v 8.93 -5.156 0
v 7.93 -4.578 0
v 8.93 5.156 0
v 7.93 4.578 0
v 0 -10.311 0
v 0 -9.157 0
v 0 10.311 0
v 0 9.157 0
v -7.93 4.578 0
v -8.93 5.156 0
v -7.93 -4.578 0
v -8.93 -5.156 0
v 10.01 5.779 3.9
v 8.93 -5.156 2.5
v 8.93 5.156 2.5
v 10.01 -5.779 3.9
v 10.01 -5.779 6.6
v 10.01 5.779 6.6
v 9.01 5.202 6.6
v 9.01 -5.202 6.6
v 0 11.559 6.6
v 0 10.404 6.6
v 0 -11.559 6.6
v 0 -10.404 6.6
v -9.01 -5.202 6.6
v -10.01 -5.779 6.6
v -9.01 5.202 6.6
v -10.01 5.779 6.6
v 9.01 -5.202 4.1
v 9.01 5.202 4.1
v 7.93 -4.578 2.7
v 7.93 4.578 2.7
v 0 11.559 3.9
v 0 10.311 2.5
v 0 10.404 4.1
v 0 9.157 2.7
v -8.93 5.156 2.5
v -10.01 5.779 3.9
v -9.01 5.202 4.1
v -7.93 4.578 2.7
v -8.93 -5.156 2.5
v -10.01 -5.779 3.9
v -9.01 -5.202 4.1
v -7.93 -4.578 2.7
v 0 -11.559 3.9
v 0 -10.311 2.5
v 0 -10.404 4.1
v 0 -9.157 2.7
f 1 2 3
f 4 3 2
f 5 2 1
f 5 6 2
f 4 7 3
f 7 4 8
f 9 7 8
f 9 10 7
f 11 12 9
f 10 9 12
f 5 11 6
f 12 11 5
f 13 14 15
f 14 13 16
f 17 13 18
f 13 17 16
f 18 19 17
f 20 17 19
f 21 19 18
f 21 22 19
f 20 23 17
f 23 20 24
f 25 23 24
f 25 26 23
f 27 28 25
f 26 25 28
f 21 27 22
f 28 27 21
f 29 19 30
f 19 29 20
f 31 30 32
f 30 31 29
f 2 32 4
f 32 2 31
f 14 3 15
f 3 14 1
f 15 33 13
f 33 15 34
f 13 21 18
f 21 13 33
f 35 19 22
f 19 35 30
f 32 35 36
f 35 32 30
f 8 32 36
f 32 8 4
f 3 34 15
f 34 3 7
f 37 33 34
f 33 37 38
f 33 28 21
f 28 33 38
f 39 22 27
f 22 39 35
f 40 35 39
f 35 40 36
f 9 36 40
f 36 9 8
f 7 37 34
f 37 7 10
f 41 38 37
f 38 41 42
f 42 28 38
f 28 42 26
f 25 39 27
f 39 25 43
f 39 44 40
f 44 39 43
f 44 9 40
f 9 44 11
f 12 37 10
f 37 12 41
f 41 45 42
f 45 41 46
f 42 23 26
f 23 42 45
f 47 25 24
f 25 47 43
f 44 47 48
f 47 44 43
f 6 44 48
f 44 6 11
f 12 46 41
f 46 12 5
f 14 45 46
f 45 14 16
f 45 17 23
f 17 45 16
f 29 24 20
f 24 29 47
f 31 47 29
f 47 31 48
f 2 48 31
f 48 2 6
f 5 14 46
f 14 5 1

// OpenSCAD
// file: Transforms.scad
module shine(angle=10, length=10, height=10, center=true) {
    if($children != 0) {
        intersection() {
            linear_extrude(height) {
                if(center) {
                    polygon([[0,0] , [length*cos(angle/2),length*sin(angle/2)] , [length,0] , [length*cos(-angle/2),length*sin(-angle/2)]]);
                }
                else {
                    polygon([[0,0] , [length*cos(angle),length*sin(angle)] ,  [length*cos(angle/2),length*sin(angle/2)] , [length,0]]);
                }
            } 
            children(); 
        }
    }   
    else {
        linear_extrude(height) {
            if(center) {
                polygon([[0,0] , [length*cos(angle/2),length*sin(angle/2)] , [length,0] , [length*cos(-angle/2),length*sin(-angle/2)]]);
            }
            else {
                polygon([[0,0] , [length*cos(angle),length*sin(angle)] ,  [length*cos(angle/2),length*sin(angle/2)] , [length,0]]);
            }
        }
    }  
}  

    
module cut(size=[10,10,10],translation=[0,0,0]) {
    intersection() {
        children();
        translate(translation) cube(size);
    }
}
// main file
use <Transforms.scad>

beamSize = 1;			//Thickness of the beam
beamHeight = 2.5;			//The height of either one of the upper or lower beams.
beamOuterShift = 1.4;		//How far should the outer edge point of the transition from either lower or upper section to middle section be shifted inwards?
beamShift = 1.6;			//How far should the two sections be spread apart?

beamPlay = 0.08; 			//How much room should be left between 


module beam() {
	translate([- (beamSize*2 + beamPlay),0]) 
	polygon([ 	[0,0],
				[beamSize,0],
				[beamSize, beamHeight],
				[beamSize*2 + beamPlay, beamOuterShift + beamHeight],
				[beamSize*2 + beamPlay, beamHeight*2 + beamShift],
				[beamSize   + beamPlay, beamHeight*2 + beamShift],
				[beamSize   + beamPlay, beamHeight + beamShift],
				[0, beamHeight + beamShift - beamOuterShift] ]);
}


module alignedBeam() {
shine(length=20,height=10,angle=60)
translate([10.01,7,0]) rotate([90,0,0]) linear_extrude(height = 15,convexity=3) {
	beam();
}
}

module hexPad() 
render(4) for(i=[0:5]) {
	rotate([0,0,i*60]) alignedBeam();
}

module hexStrip(l = 3) {
	for(i=[0:l-1]) {
		translate([20*i,0,0]) hexPad();
	}
}

module hexGrid(x, y, leftEdge= true, rightEdge= true) {
	for(i=[0:y-1]) {
		translate([0, sin(60) * 20 * i]) {
			if(i%2 == 0) {
				hexStrip(x);
			}
			else {
				if(leftEdge && rightEdge) {
					translate([-10, 0, 0]) hexStrip(x +1);
				}
				else if(leftEdge) {
					translate([-10, 0, 0]) hexStrip(x);
				}
				else if(rightEdge) {
					translate([10, 0, 0]) hexStrip(x);
				}
				else {
					translate([10, 0, 0]) hexStrip(x -1);
				}
			}
		}
	}
}

hexGrid(1,1, false, false);
